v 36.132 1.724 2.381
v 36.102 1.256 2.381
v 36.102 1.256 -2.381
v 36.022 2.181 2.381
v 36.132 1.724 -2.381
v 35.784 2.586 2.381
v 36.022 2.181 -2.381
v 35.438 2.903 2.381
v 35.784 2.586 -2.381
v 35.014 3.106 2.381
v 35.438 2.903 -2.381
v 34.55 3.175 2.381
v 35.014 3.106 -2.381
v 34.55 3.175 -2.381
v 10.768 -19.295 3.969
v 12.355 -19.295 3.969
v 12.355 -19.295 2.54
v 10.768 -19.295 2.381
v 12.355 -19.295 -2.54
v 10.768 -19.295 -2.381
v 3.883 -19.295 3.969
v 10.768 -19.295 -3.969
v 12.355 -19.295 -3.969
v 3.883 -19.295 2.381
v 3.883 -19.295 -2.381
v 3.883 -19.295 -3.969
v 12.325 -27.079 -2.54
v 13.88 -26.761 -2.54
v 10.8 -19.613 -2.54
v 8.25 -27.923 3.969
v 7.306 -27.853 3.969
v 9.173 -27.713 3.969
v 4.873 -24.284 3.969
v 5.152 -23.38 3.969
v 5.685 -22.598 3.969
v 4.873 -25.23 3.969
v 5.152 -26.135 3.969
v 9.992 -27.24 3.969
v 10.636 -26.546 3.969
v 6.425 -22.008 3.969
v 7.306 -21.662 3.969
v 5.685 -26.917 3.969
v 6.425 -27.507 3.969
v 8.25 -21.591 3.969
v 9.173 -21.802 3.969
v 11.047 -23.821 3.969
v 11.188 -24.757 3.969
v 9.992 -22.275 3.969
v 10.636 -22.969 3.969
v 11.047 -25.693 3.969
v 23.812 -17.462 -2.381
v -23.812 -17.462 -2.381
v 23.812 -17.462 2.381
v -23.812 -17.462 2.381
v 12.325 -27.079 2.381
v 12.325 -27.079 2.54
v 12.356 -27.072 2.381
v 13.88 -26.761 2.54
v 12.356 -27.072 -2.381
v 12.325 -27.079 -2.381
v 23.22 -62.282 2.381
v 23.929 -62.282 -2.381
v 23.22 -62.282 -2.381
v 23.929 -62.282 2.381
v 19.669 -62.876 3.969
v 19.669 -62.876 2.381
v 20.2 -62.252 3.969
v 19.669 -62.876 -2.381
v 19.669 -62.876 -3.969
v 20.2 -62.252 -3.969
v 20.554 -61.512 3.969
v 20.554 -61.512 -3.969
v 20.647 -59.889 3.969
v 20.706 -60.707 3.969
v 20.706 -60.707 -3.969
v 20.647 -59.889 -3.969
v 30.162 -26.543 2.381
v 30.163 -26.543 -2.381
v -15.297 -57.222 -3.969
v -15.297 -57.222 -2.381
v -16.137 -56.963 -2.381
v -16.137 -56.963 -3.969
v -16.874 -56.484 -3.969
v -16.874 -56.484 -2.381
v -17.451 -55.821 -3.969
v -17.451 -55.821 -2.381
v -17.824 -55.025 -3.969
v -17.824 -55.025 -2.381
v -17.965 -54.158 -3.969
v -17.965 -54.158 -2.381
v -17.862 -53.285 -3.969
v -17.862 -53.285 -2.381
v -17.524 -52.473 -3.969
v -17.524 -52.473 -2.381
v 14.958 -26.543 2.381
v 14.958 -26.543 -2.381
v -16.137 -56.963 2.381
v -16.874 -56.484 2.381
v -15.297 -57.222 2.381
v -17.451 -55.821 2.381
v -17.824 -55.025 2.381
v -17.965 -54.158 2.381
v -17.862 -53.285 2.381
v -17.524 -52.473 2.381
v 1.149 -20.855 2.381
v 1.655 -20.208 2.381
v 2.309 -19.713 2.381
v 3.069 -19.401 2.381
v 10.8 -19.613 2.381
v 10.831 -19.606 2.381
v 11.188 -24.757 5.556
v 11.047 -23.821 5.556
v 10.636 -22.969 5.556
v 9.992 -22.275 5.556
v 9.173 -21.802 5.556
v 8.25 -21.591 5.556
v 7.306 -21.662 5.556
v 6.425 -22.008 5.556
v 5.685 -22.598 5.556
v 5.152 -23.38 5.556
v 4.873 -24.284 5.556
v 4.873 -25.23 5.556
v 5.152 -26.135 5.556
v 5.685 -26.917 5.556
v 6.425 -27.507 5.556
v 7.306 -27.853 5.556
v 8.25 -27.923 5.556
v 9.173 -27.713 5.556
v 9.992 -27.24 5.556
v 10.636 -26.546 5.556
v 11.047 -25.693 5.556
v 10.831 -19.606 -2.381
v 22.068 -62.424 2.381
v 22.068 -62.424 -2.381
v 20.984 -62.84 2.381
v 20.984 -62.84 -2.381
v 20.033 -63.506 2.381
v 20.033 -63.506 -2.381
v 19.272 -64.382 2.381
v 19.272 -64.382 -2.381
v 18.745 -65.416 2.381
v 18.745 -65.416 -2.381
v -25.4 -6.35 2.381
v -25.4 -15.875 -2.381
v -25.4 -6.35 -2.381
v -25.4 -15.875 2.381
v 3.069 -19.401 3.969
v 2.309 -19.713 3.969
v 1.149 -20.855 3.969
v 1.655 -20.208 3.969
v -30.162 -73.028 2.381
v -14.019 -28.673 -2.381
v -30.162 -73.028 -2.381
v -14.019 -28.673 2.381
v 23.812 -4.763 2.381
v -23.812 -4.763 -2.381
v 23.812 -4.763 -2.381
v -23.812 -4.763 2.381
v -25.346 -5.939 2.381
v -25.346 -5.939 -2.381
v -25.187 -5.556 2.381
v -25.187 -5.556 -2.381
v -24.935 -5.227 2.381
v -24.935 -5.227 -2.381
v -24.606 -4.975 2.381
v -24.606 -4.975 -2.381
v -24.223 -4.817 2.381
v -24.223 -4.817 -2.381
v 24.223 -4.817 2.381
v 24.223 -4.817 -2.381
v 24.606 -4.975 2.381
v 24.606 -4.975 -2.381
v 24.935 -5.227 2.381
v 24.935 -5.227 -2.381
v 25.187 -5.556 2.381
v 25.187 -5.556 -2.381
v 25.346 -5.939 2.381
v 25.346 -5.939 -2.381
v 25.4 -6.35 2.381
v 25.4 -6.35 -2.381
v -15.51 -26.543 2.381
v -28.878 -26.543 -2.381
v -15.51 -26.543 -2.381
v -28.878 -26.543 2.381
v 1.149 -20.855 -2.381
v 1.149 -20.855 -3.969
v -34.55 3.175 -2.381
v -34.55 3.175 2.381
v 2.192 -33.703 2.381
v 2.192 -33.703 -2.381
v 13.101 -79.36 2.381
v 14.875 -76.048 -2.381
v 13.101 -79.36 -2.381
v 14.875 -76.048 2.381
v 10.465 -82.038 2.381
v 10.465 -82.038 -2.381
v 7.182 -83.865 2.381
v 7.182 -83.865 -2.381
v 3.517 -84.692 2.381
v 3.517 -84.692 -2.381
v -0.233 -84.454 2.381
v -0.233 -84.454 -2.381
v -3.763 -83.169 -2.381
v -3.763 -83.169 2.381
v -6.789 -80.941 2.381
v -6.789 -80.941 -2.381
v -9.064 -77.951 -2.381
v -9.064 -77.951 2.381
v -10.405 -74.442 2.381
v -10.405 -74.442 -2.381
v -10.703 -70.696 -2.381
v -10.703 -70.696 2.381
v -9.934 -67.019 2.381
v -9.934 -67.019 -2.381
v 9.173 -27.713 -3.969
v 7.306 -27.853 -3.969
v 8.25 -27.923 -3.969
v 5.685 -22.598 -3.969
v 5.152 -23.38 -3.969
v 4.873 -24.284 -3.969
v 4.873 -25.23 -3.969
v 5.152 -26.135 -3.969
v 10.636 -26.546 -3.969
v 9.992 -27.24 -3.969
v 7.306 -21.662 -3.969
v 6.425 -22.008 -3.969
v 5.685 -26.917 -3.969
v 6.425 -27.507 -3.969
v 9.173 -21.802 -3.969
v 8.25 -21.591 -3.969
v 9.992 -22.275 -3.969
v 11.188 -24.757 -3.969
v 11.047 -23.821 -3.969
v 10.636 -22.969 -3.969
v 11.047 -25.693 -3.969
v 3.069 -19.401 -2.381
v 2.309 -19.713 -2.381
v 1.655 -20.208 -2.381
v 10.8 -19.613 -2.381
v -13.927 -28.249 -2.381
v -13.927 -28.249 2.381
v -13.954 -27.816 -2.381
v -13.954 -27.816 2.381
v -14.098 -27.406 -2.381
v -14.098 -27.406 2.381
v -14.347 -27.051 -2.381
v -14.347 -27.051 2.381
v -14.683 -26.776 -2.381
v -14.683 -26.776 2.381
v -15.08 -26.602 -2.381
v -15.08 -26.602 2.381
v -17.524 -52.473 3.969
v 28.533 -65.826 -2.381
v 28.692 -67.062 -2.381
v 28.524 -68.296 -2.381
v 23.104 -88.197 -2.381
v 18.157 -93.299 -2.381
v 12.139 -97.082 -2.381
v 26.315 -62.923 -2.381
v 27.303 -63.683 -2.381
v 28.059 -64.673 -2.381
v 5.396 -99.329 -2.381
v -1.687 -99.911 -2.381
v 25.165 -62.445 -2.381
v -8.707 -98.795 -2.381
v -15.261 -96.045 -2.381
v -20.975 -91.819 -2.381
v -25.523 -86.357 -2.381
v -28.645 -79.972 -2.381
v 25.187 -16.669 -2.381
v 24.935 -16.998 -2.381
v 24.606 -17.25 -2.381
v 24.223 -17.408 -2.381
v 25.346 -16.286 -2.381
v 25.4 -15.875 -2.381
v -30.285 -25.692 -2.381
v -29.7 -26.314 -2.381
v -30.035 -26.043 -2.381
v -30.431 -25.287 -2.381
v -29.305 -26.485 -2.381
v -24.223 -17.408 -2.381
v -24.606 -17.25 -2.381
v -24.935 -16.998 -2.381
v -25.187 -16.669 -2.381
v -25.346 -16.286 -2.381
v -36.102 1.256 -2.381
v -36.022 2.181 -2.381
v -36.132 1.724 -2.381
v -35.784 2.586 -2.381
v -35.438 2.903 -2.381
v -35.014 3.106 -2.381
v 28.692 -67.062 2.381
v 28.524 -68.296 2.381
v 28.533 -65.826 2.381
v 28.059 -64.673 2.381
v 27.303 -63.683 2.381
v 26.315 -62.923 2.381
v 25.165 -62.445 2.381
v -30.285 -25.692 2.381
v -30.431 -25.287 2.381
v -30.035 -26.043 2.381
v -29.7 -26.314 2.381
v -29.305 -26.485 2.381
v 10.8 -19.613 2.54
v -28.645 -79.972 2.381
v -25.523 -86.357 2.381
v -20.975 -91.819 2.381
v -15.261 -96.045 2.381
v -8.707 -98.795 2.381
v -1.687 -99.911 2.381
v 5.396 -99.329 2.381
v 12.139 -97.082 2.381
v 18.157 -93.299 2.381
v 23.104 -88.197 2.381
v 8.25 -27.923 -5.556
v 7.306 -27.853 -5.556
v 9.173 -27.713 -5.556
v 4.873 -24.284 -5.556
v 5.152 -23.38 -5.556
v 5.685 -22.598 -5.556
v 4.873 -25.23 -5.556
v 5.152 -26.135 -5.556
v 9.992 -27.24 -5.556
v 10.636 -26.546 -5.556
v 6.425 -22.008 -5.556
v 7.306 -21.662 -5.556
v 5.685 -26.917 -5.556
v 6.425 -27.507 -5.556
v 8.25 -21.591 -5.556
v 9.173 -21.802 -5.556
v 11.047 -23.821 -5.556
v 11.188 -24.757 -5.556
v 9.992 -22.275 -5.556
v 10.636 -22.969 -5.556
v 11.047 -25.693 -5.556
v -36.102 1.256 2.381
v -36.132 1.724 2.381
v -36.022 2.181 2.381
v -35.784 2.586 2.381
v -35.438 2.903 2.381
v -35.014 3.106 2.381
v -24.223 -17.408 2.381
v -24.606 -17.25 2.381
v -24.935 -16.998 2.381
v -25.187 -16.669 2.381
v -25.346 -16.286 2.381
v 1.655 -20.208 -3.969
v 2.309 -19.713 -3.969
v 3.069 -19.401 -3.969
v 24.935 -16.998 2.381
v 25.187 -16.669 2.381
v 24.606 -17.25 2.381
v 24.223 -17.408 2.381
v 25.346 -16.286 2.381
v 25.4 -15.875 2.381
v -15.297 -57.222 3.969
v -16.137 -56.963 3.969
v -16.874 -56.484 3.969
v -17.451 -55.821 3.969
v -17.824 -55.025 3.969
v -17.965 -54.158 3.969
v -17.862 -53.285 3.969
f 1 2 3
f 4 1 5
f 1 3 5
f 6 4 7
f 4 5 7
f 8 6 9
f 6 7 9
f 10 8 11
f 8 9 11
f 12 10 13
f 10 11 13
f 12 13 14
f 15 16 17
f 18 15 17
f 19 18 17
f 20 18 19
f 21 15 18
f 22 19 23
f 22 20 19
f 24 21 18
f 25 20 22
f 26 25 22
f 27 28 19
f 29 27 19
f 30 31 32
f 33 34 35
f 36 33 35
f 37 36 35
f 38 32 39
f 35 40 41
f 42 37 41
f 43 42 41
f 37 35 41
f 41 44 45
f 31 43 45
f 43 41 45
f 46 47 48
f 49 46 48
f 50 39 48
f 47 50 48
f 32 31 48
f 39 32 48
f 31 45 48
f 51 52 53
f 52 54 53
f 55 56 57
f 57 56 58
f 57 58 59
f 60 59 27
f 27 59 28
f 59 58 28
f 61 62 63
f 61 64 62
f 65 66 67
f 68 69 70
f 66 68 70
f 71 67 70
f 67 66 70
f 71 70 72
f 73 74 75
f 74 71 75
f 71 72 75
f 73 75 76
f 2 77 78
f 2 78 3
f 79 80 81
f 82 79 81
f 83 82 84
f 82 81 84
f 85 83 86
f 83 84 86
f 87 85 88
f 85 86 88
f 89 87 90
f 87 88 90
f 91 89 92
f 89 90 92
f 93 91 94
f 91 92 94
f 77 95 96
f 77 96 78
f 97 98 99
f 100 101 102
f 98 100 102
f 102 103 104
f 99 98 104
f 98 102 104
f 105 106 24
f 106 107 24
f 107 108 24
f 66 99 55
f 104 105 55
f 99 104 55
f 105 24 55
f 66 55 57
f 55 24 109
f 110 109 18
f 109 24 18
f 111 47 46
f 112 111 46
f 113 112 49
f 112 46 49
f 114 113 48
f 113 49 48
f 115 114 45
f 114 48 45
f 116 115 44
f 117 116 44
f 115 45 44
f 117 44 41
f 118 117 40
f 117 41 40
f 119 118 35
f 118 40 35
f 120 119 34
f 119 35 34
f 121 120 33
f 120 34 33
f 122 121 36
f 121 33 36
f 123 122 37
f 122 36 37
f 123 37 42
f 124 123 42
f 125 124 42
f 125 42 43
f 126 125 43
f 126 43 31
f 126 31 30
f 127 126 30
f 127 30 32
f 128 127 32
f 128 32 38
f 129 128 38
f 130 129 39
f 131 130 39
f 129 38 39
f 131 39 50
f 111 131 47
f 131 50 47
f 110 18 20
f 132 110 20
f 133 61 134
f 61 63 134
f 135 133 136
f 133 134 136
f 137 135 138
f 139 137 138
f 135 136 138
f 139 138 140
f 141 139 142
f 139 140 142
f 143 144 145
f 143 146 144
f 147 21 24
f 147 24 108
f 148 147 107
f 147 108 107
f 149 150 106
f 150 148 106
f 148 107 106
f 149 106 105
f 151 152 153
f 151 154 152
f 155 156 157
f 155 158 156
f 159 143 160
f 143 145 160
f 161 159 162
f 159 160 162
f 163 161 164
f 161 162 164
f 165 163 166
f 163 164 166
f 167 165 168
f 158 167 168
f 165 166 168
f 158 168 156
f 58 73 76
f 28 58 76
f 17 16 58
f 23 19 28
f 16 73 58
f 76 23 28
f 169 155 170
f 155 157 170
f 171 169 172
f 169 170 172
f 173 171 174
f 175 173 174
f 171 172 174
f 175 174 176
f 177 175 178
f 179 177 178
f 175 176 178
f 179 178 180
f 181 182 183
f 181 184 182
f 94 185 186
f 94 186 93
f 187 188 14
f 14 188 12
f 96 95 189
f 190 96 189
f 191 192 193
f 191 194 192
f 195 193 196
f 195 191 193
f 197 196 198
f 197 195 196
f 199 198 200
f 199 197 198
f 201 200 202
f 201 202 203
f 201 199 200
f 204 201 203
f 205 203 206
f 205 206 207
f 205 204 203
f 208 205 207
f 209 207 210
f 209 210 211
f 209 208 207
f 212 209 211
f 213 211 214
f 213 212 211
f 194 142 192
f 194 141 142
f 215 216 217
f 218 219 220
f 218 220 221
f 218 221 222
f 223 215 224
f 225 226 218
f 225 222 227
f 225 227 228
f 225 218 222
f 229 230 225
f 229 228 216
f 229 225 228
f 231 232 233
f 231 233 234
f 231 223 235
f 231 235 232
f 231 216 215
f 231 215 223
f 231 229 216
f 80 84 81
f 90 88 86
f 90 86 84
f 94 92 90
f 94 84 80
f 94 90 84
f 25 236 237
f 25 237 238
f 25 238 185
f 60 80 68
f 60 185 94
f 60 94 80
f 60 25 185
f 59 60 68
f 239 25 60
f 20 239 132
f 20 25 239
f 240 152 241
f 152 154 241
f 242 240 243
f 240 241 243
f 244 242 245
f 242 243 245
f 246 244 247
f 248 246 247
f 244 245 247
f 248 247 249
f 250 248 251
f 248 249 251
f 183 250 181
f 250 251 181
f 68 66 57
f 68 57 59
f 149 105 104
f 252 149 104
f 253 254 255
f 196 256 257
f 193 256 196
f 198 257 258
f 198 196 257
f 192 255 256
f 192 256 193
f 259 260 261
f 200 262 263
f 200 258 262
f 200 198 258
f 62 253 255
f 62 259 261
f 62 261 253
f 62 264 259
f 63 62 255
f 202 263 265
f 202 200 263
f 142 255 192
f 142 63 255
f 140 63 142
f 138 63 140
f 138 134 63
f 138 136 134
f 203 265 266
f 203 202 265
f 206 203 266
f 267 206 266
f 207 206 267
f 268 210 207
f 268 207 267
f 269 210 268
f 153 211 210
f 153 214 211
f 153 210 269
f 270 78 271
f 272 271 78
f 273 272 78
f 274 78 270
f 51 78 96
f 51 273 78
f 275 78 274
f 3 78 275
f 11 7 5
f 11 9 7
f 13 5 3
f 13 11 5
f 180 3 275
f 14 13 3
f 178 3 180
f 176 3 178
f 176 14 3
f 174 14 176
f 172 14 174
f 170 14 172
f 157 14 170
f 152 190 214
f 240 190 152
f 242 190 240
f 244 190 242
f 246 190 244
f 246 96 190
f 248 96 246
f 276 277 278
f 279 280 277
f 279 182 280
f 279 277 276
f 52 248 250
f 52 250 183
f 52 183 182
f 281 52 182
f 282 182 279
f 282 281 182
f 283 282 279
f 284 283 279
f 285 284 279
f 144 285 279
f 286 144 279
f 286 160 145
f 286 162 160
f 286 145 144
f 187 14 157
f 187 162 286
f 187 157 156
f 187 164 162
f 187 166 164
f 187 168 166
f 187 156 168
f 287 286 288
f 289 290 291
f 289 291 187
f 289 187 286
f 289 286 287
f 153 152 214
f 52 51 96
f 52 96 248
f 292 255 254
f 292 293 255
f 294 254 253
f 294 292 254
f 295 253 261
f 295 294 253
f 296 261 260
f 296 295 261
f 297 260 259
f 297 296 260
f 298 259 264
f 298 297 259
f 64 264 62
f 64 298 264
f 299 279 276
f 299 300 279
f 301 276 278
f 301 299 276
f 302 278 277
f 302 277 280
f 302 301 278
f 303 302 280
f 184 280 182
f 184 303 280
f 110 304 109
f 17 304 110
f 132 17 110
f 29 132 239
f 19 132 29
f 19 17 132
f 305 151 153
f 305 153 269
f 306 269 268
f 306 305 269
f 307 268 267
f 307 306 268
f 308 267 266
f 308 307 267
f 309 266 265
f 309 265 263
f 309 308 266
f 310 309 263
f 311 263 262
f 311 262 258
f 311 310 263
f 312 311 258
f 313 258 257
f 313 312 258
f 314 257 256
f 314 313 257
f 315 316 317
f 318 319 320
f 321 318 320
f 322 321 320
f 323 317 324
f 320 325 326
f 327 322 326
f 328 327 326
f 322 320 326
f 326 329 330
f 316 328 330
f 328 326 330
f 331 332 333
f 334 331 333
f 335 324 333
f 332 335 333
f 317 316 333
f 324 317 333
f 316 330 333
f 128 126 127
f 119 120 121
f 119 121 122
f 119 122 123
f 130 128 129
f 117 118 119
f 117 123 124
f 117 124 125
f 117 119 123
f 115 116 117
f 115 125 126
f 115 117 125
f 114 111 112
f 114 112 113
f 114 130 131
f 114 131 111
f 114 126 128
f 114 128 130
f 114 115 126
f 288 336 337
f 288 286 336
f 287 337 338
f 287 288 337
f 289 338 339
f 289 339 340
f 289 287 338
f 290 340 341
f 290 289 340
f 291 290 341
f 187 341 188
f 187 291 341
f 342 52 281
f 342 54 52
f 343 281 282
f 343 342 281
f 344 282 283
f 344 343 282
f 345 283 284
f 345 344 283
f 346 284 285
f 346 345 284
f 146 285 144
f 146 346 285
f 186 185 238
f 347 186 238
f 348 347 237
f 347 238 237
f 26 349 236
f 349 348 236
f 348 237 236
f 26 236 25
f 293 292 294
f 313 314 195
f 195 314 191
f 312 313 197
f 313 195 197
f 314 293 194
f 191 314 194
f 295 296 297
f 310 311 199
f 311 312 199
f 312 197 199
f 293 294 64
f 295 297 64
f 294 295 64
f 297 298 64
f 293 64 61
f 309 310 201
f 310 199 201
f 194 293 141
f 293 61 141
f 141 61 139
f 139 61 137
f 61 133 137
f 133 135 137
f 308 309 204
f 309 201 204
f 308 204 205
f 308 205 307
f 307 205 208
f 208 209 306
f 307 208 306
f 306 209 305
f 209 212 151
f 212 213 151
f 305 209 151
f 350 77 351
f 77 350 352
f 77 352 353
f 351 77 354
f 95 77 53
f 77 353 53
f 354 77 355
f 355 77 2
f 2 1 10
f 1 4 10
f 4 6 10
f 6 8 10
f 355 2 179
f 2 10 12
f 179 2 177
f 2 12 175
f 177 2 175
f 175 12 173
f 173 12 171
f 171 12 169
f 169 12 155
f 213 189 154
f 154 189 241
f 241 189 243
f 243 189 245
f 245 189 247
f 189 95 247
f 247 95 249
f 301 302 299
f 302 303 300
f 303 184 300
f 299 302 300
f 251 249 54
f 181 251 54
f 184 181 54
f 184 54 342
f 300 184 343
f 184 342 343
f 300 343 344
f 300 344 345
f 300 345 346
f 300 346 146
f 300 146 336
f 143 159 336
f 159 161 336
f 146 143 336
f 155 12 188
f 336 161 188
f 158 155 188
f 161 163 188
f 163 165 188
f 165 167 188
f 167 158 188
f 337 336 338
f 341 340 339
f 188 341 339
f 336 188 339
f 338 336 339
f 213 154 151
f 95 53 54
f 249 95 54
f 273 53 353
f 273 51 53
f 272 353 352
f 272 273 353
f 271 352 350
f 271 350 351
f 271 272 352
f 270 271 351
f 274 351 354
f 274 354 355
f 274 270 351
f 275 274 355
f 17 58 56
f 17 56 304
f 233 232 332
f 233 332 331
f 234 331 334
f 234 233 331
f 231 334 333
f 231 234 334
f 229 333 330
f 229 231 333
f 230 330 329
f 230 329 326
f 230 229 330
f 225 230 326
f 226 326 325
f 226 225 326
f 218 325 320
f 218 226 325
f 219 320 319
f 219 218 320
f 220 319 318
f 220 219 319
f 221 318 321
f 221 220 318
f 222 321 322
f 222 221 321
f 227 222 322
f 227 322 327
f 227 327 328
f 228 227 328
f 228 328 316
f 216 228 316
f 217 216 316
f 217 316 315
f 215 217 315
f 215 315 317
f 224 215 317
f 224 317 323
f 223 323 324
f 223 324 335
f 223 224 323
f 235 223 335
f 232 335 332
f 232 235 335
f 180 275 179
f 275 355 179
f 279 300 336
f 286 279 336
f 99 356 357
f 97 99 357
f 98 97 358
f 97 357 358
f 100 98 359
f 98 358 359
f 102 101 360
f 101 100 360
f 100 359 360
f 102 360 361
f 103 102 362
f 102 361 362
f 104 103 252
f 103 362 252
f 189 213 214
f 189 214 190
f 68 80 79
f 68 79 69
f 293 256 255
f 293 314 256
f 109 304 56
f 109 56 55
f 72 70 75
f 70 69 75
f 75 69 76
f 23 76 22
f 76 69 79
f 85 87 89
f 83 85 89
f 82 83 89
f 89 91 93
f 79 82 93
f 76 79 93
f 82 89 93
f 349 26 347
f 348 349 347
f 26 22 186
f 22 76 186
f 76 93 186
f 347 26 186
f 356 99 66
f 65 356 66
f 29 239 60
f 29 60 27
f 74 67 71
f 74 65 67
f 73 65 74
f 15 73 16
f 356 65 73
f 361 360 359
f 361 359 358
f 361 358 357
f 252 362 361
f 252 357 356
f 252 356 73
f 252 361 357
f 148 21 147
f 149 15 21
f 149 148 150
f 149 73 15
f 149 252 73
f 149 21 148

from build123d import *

# Parameters (mm, degrees)
SKETCH1_W           = 60.325
SKETCH1_H           = 3.175
SKETCH1_W_2         = 50.8
SKETCH1_H_2         = 12.7
BOSS_EXTRUDE1_DEPTH = 2.38125
BOSS_EXTRUDE2_DEPTH = 1.5875
SKETCH3_W           = 7.9375
SKETCH3_H           = 44.481099137
BOSS_EXTRUDE3_DEPTH = 1.5875
FILLET1_R           = 3.175
SKETCH4_W           = 5.08
SKETCH4_H           = 7.62
CUT_EXTRUDE1_DEPTH  = 1.5875
SKETCH5_R           = 3.175
BOSS_EXTRUDE4_DEPTH = 1.5875
BOSS_EXTRUDE5_DEPTH = 4.7625
FILLET5_R           = 1.5875
BOSS_EXTRUDE6_DEPTH = 4.7625
FILLET6_R           = 1.5875
FILLET7_R           = 4.7625


with BuildPart() as part:
    # Sketch1 → Boss-Extrude1 (new, symmetric)
    # profile 1 of 2: a face of its own
    with BuildSketch(Plane.XY):
        with Locations((0, 1.5875)):
            Rectangle(SKETCH1_W, SKETCH1_H)
    # profile 2 of 2: a face of its own
    with BuildSketch(Plane.XY):
        with BuildLine():
            Line((30.1625, 0), (-30.1625, 0))
            Line((-30.1625, 0), (-30.1625, -26.543))
            Line((-30.1625, -26.543), (-13.24322167, -26.543))
            Line((-13.24322167, -26.543), (-30.1625, -73.028335164))
            ThreePointArc((-30.1625, -73.028335164), (-8.706855369, -98.7950809), (23.104224388, -88.196728338))
            Line((23.104224388, -88.196728338), (30.1625, -62.282363628))
            Line((30.1625, -62.282363628), (19.885481288, -62.282363628))
            Line((19.885481288, -62.282363628), (14.875106331, -76.048255685))
            ThreePointArc((14.875106331, -76.048255685), (-2.044020786, -83.937774229), (-9.93353933, -67.018647112))
            Line((-9.93353933, -67.018647112), (4.798391431, -26.543))
            Line((4.798391431, -26.543), (30.1625, -26.543))
            Line((30.1625, -26.543), (30.1625, 0))
        make_face()
        with Locations((0, -11.1125)):
            Rectangle(SKETCH1_W_2, SKETCH1_H_2, mode=Mode.SUBTRACT)
    extrude(amount=BOSS_EXTRUDE1_DEPTH, both=True)

    # Sketch6 → Boss-Extrude5 (add)
    with BuildSketch(Plane.XY.offset(2.38125)):
        Polygon((14.958391431, -26.543), (2.192197939, -33.70345777), (4.798391431, -26.543), align=None)
    extrude(amount=-BOSS_EXTRUDE5_DEPTH)

    # Fillet5
    fillet5_edges = [part.edges().sort_by_distance(p)[0] for p in [
        (-25.4, -4.7625, 0),
        (-25.4, -17.4625, 0),
        (25.4, -17.4625, 0),
        (25.4, -4.7625, 0),
    ]]
    fillet(fillet5_edges, radius=FILLET5_R)


with BuildPart() as body_2:
    # Sketch2 → Boss-Extrude2 (new body)
    with BuildSketch(Plane.XY.offset(2.38125)):
        Polygon((2.070915662, -19.294973045), (-19.890264434, -56.479620237), (19.669315265, -62.876274894), (10.767724981, -19.294973045), align=None)
    extrude(amount=BOSS_EXTRUDE2_DEPTH)


with BuildPart() as body_3:
    # Mirror1: mirrored copy
    add(body_2.part.mirror(Plane.XY))


with BuildPart() as body_2_1:
    add(body_2.part)

    add(body_3.part)  # Boss-Extrude3 merges body 3
    # Sketch3 → Boss-Extrude3 (add, along a direction that is not the sketch's normal)
    with BuildSketch(Plane(origin=(6.553281388, 1.338524171, 0), x_dir=(0, 0, -1), z_dir=(0.9797712442921276, 0.2001207357028661, 0))):
        with Locations((0, -43.300054363)):
            Rectangle(SKETCH3_W, SKETCH3_H)
    extrude(amount=BOSS_EXTRUDE3_DEPTH, dir=(1, 0, 0))

    # Fillet1
    # the kernel refuses this fillet: 3.175 mm, written as the material it takes off along each edge
    with BuildSketch(Plane(origin=(-19.890264434, -56.479620237, 9.250541142), x_dir=(0.5085307915682564, 0.8610438049408187, 0), z_dir=(0, 0, -1))) as fillet1_piece_1:
        with BuildLine():
            CenterArc((FILLET1_R * 1.46542250607, FILLET1_R), FILLET1_R, 158.619024622, 111.380975378)
            Line((FILLET1_R * 0.534245587006, FILLET1_R * 1.36456761432), (FILLET1_R * 0.515622048625, FILLET1_R * 1.37185896661))
            Line((FILLET1_R * 0.515622048625, FILLET1_R * 1.37185896661), (-FILLET1_R * 0.0293084501213, -FILLET1_R * 0.02))
            Line((-FILLET1_R * 0.0293084501213, -FILLET1_R * 0.02), (FILLET1_R * 1.46542250607, -FILLET1_R * 0.02))
            Line((FILLET1_R * 1.46542250607, -FILLET1_R * 0.02), (FILLET1_R * 1.46542250607, 0))
        make_face()
    extrude(amount=24.851082284, mode=Mode.SUBTRACT)
    with BuildSketch(Plane(origin=(21.256815265, -62.876274894, -11.590075114), x_dir=(-0.20012073570286557, 0.9797712442921276, 0), z_dir=(0, 0, 1))) as fillet1_piece_2:
        with BuildLine():
            CenterArc((3.048530046, 3.175), FILLET1_R, 210.671448693, 59.328551307)
            Line((0.317691668, 1.55538685), (0.2630749, 1.522994587))
            ThreePointArc((0.2630749, 1.522994587), (0.09663036, 0.790401092), (-0.062215474, 0.012707667))
            Line((-0.062215474, 0.012707667), (0, -0.0635))
            Line((0, -0.0635), (3.048530046, -0.0635))
            Line((3.048530046, -0.0635), (3.048530046, 0))
        make_face()
    extrude(amount=23.180150228, mode=Mode.SUBTRACT)
    with BuildSketch(Plane(origin=(-19.890264434, -56.479620237, -9.250541142), x_dir=(0.5085307915682564, 0.8610438049408187, 0), z_dir=(0, 0, 1))) as fillet1_piece_3:
        with BuildLine():
            CenterArc((FILLET1_R * 1.46542250607, -FILLET1_R), FILLET1_R, 90, 111.380975378)
            Line((FILLET1_R * 0.534245587006, -FILLET1_R * 1.36456761432), (FILLET1_R * 0.515622048625, -FILLET1_R * 1.37185896661))
            Line((FILLET1_R * 0.515622048625, -FILLET1_R * 1.37185896661), (-FILLET1_R * 0.0293084501213, FILLET1_R * 0.02))
            Line((-FILLET1_R * 0.0293084501213, FILLET1_R * 0.02), (FILLET1_R * 1.46542250607, FILLET1_R * 0.02))
            Line((FILLET1_R * 1.46542250607, FILLET1_R * 0.02), (FILLET1_R * 1.46542250607, 0))
        make_face()
    extrude(amount=24.851082284, mode=Mode.SUBTRACT)
    with BuildSketch(Plane(origin=(2.070915662, -19.294973045, 2.149340453), x_dir=(-0.5085307915682565, -0.8610438049408186, 0), z_dir=(0, 0, -1))) as fillet1_piece_4:
        with BuildLine():
            CenterArc((FILLET1_R * 0.570783049145, -FILLET1_R), FILLET1_R, 90, 59.433984029)
            Line((-FILLET1_R * 0.290260755796, -FILLET1_R * 0.491469208432), (-FILLET1_R * 0.307481631894, -FILLET1_R * 0.4812985926))
            Line((-FILLET1_R * 0.307481631894, -FILLET1_R * 0.4812985926), (-FILLET1_R * 0.0114156609829, FILLET1_R * 0.02))
            Line((-FILLET1_R * 0.0114156609829, FILLET1_R * 0.02), (FILLET1_R * 0.570783049145, FILLET1_R * 0.02))
            Line((FILLET1_R * 0.570783049145, FILLET1_R * 0.02), (FILLET1_R * 0.570783049145, 0))
        make_face()
    extrude(amount=10.648680905, mode=Mode.SUBTRACT)
    with BuildSketch(Plane(origin=(2.070915662, -19.294973045, -2.149340453), x_dir=(-0.5085307915682565, -0.8610438049408186, 0), z_dir=(0, 0, 1))) as fillet1_piece_5:
        with BuildLine():
            CenterArc((FILLET1_R * 0.570783049145, FILLET1_R), FILLET1_R, 210.566015971, 59.433984029)
            Line((-FILLET1_R * 0.290260755796, FILLET1_R * 0.491469208432), (-FILLET1_R * 0.307481631894, FILLET1_R * 0.4812985926))
            Line((-FILLET1_R * 0.307481631894, FILLET1_R * 0.4812985926), (-FILLET1_R * 0.0114156609829, -FILLET1_R * 0.02))
            Line((-FILLET1_R * 0.0114156609829, -FILLET1_R * 0.02), (FILLET1_R * 0.570783049145, -FILLET1_R * 0.02))
            Line((FILLET1_R * 0.570783049145, -FILLET1_R * 0.02), (FILLET1_R * 0.570783049145, 0))
        make_face()
    extrude(amount=10.648680905, mode=Mode.SUBTRACT)

    # Sketch4 → Cut-Extrude1 (cut)
    with BuildSketch(Plane(origin=(8.077204698, 1.649789332, 0), x_dir=(0, 0, -1), z_dir=(0.9797712442921276, 0.20012073570286604, 0))):
        with Locations((0, -25.187196462)):
            Rectangle(SKETCH4_W, SKETCH4_H)
    extrude(amount=-CUT_EXTRUDE1_DEPTH, mode=Mode.SUBTRACT)


with BuildPart() as body_3_2:
    # Sketch5 → Boss-Extrude4 (new body)
    with BuildSketch(Plane.XY.offset(3.96875)):
        with Locations((8.012784298, -24.757197764)):
            Circle(SKETCH5_R)
    extrude(amount=BOSS_EXTRUDE4_DEPTH)


with BuildPart() as body_4:
    # Mirror2: mirrored copy
    add(body_3_2.part.mirror(Plane.XY))


with BuildPart() as body_5:
    # Sketch7 → Boss-Extrude6 (new body)
    with BuildSketch(Plane.XY.offset(2.38125)):
        Polygon((-30.1625, -26.543), (-36.5125, 3.175), (-30.1625, 3.175), align=None)
    extrude(amount=-BOSS_EXTRUDE6_DEPTH)


with BuildPart() as body_6:
    # Mirror3: mirrored copy
    add(body_5.part.mirror(Plane(origin=(0, 0, 0), x_dir=(0, 0, 1), z_dir=(1, 0, 0))))


with BuildPart() as part_1:
    add(part.part)

    # Combine1: union body 6, body 5
    add(body_6.part)
    add(body_5.part)

    # Fillet6
    fillet6_edges = [part_1.edges().sort_by_distance(p)[0] for p in [
        (-30.1625, -26.543, 0),
        (-36.5125, 3.175, 0),
        (-13.24322167, -26.543, 0),
        (36.5125, 3.175, 0),
    ]]
    fillet(fillet6_edges, radius=FILLET6_R)

    # Fillet7
    fillet7_edges = [part_1.edges().sort_by_distance(p)[0] for p in [
        (19.885481288, -62.282363628, 0),
        (30.1625, -62.282363628, 0),
    ]]
    fillet(fillet7_edges, radius=FILLET7_R)


solid = Compound([body_2_1.part, body_3_2.part, body_4.part, part_1.part])
